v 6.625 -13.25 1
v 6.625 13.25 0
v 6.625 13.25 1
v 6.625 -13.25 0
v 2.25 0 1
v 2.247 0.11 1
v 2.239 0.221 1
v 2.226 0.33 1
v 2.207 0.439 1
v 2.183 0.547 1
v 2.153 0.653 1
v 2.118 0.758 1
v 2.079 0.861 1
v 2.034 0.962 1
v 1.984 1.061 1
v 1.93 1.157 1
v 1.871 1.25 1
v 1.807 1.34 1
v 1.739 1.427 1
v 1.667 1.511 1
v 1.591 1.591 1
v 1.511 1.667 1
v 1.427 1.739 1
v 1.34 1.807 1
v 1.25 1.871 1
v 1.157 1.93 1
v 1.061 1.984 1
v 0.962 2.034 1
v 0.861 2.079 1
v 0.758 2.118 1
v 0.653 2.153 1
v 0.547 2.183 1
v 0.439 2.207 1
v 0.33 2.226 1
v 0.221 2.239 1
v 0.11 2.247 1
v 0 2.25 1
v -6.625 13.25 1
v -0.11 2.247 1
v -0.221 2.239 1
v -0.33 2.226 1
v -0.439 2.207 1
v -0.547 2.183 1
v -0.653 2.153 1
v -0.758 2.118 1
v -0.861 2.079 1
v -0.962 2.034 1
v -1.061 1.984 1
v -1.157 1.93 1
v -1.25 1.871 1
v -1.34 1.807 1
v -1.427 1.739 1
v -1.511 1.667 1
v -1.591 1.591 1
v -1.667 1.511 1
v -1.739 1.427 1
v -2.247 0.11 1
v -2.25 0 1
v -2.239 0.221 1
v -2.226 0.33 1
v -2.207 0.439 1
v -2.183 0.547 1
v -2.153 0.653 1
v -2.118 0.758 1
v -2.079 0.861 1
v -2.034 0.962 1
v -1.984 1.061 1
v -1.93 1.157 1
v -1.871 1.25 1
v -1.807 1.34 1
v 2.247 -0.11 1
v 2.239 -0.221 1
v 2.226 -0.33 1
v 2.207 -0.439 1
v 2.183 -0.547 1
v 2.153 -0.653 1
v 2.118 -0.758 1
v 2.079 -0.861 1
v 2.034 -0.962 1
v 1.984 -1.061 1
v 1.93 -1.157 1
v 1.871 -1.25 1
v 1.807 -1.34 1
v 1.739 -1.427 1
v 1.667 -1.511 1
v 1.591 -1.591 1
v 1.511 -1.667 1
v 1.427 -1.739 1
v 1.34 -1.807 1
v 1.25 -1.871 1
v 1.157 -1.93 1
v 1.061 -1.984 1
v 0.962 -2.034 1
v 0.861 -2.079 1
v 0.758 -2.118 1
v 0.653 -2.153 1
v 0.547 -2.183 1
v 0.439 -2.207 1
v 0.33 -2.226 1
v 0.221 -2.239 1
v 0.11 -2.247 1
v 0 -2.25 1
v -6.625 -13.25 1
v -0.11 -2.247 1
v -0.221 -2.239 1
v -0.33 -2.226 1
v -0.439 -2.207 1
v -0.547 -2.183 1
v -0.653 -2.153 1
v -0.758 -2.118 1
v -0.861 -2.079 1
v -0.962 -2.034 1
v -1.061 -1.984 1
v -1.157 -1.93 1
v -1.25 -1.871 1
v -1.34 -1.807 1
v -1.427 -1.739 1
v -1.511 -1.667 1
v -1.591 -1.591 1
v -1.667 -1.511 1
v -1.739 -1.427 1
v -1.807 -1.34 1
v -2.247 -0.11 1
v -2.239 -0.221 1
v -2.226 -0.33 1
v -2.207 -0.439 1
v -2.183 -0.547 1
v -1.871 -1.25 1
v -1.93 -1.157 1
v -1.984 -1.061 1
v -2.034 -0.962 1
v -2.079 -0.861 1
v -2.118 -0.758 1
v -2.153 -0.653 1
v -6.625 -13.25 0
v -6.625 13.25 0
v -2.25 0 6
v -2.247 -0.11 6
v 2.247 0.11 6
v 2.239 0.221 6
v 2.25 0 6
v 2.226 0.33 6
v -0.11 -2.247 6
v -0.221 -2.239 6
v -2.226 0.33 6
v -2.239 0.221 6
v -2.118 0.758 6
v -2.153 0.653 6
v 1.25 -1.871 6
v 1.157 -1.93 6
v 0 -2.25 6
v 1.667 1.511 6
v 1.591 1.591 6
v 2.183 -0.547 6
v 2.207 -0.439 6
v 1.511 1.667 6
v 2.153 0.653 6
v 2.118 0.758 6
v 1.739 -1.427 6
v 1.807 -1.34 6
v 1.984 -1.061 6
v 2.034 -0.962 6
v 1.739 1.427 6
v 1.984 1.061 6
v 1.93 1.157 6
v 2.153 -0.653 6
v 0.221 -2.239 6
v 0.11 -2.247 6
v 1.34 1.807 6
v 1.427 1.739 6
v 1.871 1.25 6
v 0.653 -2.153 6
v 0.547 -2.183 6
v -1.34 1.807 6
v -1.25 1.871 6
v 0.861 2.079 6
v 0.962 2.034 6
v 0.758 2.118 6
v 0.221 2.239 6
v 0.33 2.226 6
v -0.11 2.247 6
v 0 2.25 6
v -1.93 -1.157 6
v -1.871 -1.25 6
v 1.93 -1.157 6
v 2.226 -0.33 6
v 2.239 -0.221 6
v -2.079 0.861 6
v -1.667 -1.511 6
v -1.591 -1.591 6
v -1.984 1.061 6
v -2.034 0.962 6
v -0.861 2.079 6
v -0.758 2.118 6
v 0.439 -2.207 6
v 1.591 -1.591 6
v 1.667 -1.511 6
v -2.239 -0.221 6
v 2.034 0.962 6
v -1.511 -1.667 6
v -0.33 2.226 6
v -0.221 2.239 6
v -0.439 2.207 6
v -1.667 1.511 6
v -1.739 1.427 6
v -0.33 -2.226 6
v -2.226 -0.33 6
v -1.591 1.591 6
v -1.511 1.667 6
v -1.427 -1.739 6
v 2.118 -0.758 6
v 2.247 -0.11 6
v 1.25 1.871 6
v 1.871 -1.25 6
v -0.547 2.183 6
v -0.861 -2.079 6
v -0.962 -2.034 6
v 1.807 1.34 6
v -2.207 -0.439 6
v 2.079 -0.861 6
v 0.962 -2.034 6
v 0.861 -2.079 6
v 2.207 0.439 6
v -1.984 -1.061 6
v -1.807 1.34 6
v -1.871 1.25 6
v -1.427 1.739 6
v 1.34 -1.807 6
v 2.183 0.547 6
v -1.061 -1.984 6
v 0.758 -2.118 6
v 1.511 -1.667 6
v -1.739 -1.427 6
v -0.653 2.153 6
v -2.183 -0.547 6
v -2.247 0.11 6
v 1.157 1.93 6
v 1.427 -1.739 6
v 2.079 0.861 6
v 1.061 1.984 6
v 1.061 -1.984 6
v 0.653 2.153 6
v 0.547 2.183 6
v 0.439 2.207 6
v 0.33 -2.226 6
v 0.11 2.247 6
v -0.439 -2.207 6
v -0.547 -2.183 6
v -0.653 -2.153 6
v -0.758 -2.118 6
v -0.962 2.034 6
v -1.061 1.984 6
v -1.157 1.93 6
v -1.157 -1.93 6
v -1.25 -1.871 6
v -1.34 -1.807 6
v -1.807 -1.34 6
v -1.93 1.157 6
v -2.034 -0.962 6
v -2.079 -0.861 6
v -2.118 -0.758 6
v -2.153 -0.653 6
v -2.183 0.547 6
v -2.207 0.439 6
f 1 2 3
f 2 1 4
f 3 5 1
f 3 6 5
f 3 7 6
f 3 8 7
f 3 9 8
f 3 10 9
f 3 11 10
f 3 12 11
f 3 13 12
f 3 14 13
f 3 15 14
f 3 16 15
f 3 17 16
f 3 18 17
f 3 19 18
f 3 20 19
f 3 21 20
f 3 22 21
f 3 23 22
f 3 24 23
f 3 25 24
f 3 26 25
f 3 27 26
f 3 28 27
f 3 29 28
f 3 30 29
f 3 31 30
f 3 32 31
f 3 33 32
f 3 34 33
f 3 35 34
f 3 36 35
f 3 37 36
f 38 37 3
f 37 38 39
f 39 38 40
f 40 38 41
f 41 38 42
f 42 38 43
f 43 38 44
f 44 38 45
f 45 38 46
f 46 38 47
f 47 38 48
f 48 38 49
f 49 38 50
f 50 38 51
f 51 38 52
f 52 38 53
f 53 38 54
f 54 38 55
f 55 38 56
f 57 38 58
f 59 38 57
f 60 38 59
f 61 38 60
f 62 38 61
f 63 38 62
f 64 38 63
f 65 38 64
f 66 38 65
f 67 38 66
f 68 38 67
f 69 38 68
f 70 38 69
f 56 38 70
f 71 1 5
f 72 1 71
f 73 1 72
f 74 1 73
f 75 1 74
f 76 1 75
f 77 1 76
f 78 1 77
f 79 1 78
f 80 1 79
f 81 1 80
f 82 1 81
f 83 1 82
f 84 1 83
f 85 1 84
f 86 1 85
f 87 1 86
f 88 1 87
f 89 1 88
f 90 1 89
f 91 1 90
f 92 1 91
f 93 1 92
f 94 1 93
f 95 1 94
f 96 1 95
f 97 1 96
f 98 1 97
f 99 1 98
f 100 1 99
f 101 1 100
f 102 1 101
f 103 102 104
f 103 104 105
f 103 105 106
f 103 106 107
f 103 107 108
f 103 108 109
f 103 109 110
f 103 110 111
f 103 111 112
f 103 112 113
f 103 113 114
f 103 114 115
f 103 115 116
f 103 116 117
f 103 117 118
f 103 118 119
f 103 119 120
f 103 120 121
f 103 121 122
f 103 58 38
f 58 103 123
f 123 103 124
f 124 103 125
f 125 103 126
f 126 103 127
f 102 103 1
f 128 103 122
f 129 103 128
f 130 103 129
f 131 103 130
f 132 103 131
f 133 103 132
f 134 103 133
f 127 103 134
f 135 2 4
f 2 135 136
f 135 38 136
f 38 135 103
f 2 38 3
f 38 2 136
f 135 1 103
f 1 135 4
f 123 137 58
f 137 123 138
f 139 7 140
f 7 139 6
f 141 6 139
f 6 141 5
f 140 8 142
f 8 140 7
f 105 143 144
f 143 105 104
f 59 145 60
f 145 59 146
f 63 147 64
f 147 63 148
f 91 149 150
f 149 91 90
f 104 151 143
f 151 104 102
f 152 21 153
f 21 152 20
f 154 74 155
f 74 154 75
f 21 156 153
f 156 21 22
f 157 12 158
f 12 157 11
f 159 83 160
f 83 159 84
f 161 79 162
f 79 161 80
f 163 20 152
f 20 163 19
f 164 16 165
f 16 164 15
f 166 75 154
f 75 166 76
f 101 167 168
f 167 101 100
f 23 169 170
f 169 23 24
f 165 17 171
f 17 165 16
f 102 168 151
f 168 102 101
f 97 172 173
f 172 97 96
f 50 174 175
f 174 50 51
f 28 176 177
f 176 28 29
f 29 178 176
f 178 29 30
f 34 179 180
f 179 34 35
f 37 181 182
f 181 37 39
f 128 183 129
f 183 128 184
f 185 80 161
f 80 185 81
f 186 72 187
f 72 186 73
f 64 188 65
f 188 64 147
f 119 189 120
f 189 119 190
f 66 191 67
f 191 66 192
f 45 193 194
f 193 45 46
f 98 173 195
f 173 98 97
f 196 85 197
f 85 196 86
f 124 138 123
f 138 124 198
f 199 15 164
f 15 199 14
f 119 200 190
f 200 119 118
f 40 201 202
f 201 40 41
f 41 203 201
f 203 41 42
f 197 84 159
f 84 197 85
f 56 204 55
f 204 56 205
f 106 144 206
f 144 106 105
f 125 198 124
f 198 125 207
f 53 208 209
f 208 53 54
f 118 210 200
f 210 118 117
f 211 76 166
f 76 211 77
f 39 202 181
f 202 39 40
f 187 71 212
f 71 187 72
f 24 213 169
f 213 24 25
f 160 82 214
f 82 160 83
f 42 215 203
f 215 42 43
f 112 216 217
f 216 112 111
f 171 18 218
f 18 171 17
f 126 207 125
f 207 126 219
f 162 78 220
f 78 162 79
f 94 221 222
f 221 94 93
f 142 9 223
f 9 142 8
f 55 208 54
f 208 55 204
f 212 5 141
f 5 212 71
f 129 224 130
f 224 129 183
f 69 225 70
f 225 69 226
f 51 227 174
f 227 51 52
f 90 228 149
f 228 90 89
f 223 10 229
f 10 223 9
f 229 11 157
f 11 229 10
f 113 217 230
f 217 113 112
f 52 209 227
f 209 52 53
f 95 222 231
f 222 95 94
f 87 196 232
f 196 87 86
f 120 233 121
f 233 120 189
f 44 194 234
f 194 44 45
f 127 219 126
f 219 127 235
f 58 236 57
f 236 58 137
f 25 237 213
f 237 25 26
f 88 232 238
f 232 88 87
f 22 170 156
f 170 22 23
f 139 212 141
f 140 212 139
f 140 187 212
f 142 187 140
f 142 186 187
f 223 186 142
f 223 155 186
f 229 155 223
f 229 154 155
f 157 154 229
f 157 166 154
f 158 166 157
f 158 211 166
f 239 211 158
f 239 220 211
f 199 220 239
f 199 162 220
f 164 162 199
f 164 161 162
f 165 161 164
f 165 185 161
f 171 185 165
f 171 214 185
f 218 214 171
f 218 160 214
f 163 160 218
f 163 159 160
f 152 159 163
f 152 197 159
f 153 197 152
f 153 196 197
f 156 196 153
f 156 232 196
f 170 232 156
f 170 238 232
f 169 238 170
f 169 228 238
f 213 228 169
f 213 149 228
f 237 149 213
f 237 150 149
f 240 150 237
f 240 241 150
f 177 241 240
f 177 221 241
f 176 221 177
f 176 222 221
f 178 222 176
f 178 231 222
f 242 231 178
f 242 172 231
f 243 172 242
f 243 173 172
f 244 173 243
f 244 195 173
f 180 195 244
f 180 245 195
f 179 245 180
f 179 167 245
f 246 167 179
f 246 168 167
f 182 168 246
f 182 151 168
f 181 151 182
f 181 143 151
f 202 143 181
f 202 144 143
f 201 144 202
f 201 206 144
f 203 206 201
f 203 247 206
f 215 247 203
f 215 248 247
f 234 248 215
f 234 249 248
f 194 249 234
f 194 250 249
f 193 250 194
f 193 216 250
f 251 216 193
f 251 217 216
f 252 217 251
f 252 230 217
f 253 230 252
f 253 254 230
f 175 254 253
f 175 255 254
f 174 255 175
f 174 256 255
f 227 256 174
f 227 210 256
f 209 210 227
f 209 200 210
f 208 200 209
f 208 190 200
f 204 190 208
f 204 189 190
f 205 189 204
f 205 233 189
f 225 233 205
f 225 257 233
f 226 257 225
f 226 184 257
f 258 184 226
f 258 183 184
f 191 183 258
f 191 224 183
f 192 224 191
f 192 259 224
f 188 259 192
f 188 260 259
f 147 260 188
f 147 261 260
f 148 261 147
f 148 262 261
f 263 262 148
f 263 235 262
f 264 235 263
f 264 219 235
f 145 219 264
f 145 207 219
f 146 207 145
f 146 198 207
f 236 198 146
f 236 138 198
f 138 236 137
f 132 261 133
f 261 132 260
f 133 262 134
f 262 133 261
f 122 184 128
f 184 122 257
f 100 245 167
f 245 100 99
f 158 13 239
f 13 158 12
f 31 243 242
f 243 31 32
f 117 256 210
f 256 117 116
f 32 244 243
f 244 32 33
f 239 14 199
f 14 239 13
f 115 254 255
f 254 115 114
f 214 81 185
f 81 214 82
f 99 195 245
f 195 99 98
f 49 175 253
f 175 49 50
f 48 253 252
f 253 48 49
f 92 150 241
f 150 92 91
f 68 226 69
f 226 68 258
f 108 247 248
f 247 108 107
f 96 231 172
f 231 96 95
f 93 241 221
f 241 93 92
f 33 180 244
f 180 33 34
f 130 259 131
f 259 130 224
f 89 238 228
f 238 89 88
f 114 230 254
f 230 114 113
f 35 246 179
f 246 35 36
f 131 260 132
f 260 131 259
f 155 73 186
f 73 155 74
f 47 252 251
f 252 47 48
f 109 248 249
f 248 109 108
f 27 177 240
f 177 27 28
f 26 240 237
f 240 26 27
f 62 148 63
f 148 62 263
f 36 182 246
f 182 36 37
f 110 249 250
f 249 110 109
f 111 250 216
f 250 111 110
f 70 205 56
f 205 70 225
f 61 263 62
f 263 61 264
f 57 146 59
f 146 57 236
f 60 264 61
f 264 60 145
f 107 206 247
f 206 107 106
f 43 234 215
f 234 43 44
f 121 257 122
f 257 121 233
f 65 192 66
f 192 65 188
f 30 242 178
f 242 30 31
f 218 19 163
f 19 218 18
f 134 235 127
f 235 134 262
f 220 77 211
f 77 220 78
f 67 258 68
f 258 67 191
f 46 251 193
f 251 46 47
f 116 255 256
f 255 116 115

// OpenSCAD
// file: position_indicator_number.scad
/* RailEduKit/InteractiveSignallingLaboratory © 2025 by Martin Scheidt and contributors
 * License: CC-BY 4.0 - https://creativecommons.org/licenses/by/4.0/
 * Project description: The Interactive Signalling Laboratory is a tool for training in Rail
 * Applications to enhance the knowledge of control and signalling principles for rail transport systems.
 *
 * Module: position_indicator_number
 */

include <../config/global_variables.scad>
include <../config/colors.scad>

include <position_indicator_plate.scad>


module frame() {
	difference() {
		cube([ frame_width, frame_depth, 2 ], center = true);
		cube([ frame_width - 1, frame_depth - 1, 3 ], center = true);
	}
}

module piece_number(number) {
	color(INDICATOR_COLOR) union(){
		translate([ 0, 0, number_height ])
		rotate([ 180, 0, 0 ])
		linear_extrude(height = number_height) text(str(number), 7.5, halign = "center", valign = "center");
	}
}

module position_indicator_number() {
	translate([ x_start + 0 * step_size, y_start + 0.0 * step_size, 0 ])
	piece_number(1);
	translate([ x_start + 0 * step_size, y_start + 1.0 * step_size, 0 ])
	piece_number(2);
	translate([ x_start + 0 * step_size, y_start + 2.0 * step_size, 0 ])
	piece_number(3);
	translate([ x_start + 0 * step_size, y_start + 3.0 * step_size, 0 ])
	piece_number(4);
	translate([ x_start + 0 * step_size, y_start + 4.0 * step_size, 0 ])
	piece_number(5);
	translate([ x_start + 1 * step_size, y_start + 0.0 * step_size, 0 ])
	piece_number(6);
	translate([ x_start + 1 * step_size, y_start + 1.0 * step_size, 0 ])
	piece_number(7);
	translate([ x_start + 1 * step_size, y_start + 2.0 * step_size, 0 ])
	piece_number(8);
	translate([ x_start + 1 * step_size, y_start + 3.0 * step_size, 0 ])
	piece_number(9);
	translate([ x_start + 1 * step_size, y_start + 4.0 * step_size, 0 ])
	piece_number(10);
	translate([ x_start + 2 * step_size, y_start + 0.0 * step_size, 0 ])
	piece_number(11);
	translate([ x_start + 2 * step_size, y_start + 1.0 * step_size, 0 ])
	piece_number(12);
	translate([ x_start + 2 * step_size, y_start + 2.0 * step_size, 0 ])
	piece_number(13);
	translate([ x_start + 2 * step_size, y_start + 3.0 * step_size, 0 ])
	piece_number(14);
	translate([ x_start + 2 * step_size, y_start + 4.0 * step_size, 0 ])
	piece_number(15);
	translate([ x_start + 3 * step_size, y_start + 0.0 * step_size, 0 ])
	piece_number(16);
	translate([ x_start + 3 * step_size, y_start + 1.0 * step_size, 0 ])
	piece_number(17);
	translate([ x_start + 3 * step_size, y_start + 2.0 * step_size, 0 ])
	piece_number(18);
	translate([ x_start + 3 * step_size, y_start + 3.0 * step_size, 0 ])
	piece_number(19);
	translate([ x_start + 3 * step_size, y_start + 4.0 * step_size, 0 ])
	piece_number(20);
	translate([ x_start + 4 * step_size, y_start + 0.0 * step_size, 0 ])
	piece_number(21);
	translate([ x_start + 4 * step_size, y_start + 1.0 * step_size, 0 ])
	piece_number(22);
	translate([ x_start + 4 * step_size, y_start + 2.0 * step_size, 0 ])
	piece_number(23);
	translate([ x_start + 4 * step_size, y_start + 3.0 * step_size, 0 ])
	piece_number(24);
	translate([ x_start + 4 * step_size, y_start + 4.0 * step_size, 0 ])
	piece_number(25);
	translate([ x_start + 5 * step_size, y_start + 0.0 * step_size, 0 ])
	piece_number(26);
	translate([ x_start + 5 * step_size, y_start + 1.0 * step_size, 0 ])
	piece_number(27);
	translate([ x_start + 5 * step_size, y_start + 2.0 * step_size, 0 ])
	piece_number(28);
	translate([ x_start + 5 * step_size, y_start + 3.0 * step_size, 0 ])
	piece_number(29);
	translate([ x_start + 5 * step_size, y_start + 4.0 * step_size, 0 ])
	piece_number(30);
	translate([ x_start + 6 * step_size, y_start + 0.0 * step_size, 0 ])
	piece_number(31);
	translate([ x_start + 6 * step_size, y_start + 1.0 * step_size, 0 ])
	piece_number(32);
	translate([ x_start + 6 * step_size, y_start + 2.0 * step_size, 0 ])
	piece_number(33);
	translate([ x_start + 6 * step_size, y_start + 3.0 * step_size, 0 ])
	piece_number(34);
	translate([ x_start + 6 * step_size, y_start + 4.0 * step_size, 0 ])
	piece_number(35);
	translate([ x_start + 7 * step_size, y_start + 0.0 * step_size, 0 ])
	piece_number(36);
	translate([ x_start + 7 * step_size, y_start + 1.0 * step_size, 0 ])
	piece_number(37);
	translate([ x_start + 7 * step_size, y_start + 2.0 * step_size, 0 ])
	piece_number(38);
	translate([ x_start + 7 * step_size, y_start + 3.0 * step_size, 0 ])
	piece_number(39);
	translate([ x_start + 7 * step_size, y_start + 4.0 * step_size, 0 ])
	piece_number(40);
	translate([ x_start + 8 * step_size, y_start + 0.0 * step_size, 0 ])
	piece_number(41);
	translate([ x_start + 8 * step_size, y_start + 1.0 * step_size, 0 ])
	piece_number(42);
	translate([ x_start + 8 * step_size, y_start + 2.0 * step_size, 0 ])
	piece_number(43);
	translate([ x_start + 8 * step_size, y_start + 3.0 * step_size, 0 ])
	piece_number(44);
	translate([ x_start + 8 * step_size, y_start + 4.0 * step_size, 0 ])
	piece_number(45);
	translate([ x_start + 9 * step_size, y_start + 0.0 * step_size, 0 ])
	piece_number(46);
	translate([ x_start + 9 * step_size, y_start + 1.0 * step_size, 0 ])
	piece_number(47);
	translate([ x_start + 9 * step_size, y_start + 2.0 * step_size, 0 ])
	piece_number(48);
	translate([ x_start + 9 * step_size, y_start + 3.0 * step_size, 0 ])
	piece_number(49);
	translate([ x_start + 9 * step_size, y_start + 4.0 * step_size, 0 ])
	piece_number(50);
	translate([ x_start + 10 * step_size, y_start + 0.0 * step_size, 0 ])
	piece_number(51);
	translate([ x_start + 10 * step_size, y_start + 1.0 * step_size, 0 ])
	piece_number(52);
	translate([ x_start + 10 * step_size, y_start + 2.0 * step_size, 0 ])
	piece_number(53);
	translate([ x_start + 10 * step_size, y_start + 3.0 * step_size, 0 ])
	piece_number(54);
	translate([ x_start + 10 * step_size, y_start + 4.0 * step_size, 0 ])
	piece_number(55);
	translate([ x_start + 11 * step_size, y_start + 0.0 * step_size, 0 ])
	piece_number(56);
	translate([ x_start + 11 * step_size, y_start + 1.0 * step_size, 0 ])
	piece_number(57);
	translate([ x_start + 11 * step_size, y_start + 2.0 * step_size, 0 ])
	piece_number(58);
	translate([ x_start + 11 * step_size, y_start + 3.0 * step_size, 0 ])
	piece_number(59);
	translate([ x_start + 11 * step_size, y_start + 4.0 * step_size, 0 ])
	piece_number(60);
}

position_indicator_number();
// file: ../config/colors.scad
/* RailEduKit/InteractiveSignallingLaboratory © 2025 by Martin Scheidt and contributors
 * License: CC-BY 4.0 - https://creativecommons.org/licenses/by/4.0/
 * Project description: The Interactive Signalling Laboratory is a tool for training in Rail
 * Applications to enhance the knowledge of control and signalling principles for rail transport systems.
 *
 * Module: config/colors.scad
 */

// component colors
BASE_COLOR = "black";
INDICATOR_COLOR = "white";
ROUTE_COLOR = "blue";

// signal colors
ASPECT_CLEAR = "green";
ASPECT_APPROACH = "yellow";
ASPECT_STOP = "red";
// file: position_indicator_plate.scad
/* RailEduKit/InteractiveSignallingLaboratory © 2025 by Martin Scheidt and contributors
 * License: CC-BY 4.0 - https://creativecommons.org/licenses/by/4.0/
 * Project description: The Interactive Signalling Laboratory is a tool for training in Rail
 * Applications to enhance the knowledge of control and signalling principles for rail transport systems.
 *
 * Module: position_indicator_plate
 */






include <../config/global_variables.scad>
include <../config/colors.scad>

// use common parts
use <position_indicator_number.scad>


// number_plate = np
np_diameter = rail_well_spacing-2*3;
function np_height() = 1;
number_height = 0.6;

// om_pin variables are defined in track_indicator flexible   
function np_pin_diameter() = 4.5;
function np_pin_height() = 5;

frame_width = 180;
frame_depth = 180;
step_size = np_diameter+2*move_tolerance;
x_start = -(frame_width/2-np_diameter/2-1);
y_start = -(frame_depth/2-np_diameter/2-1);



module frame() {
	difference() {
		cube([ frame_width, frame_depth, 2 ], center = true);
		cube([ frame_width - 1, frame_depth - 1, 3 ], center = true);
	}
}

module number_plate(number) {
	color(BASE_COLOR) union(){
		difference() {
			cylinder(d = np_diameter, h = np_height());
			piece_number(number);
		}
		translate([ 0, 0, np_height() ])
		cylinder(h = np_pin_height(), d = np_pin_diameter());
	}

}

module position_indicator_plate() {
	/* counter = 0;
	for(x = [-(frame_width/2-np_diameter/2-1): np_diameter+2*move_tolerance: (frame_width/2-np_diameter/2-1)]){
	    for(y= [-(frame_depth/2-np_diameter/2-1): np_diameter+2*move_tolerance: (frame_depth/2-np_diameter/2-1)]){
	        translate([x,y,0])number_plate(counter);
	        counter = counter + 1;
	    }
	} */
	// generated with number_plates_creation.jl
	// still slow with rendering.
	translate([ x_start + 0 * step_size, y_start + 0.0 * step_size, 0 ])
	number_plate(1);
	translate([ x_start + 0 * step_size, y_start + 1.0 * step_size, 0 ])
	number_plate(2);
	translate([ x_start + 0 * step_size, y_start + 2.0 * step_size, 0 ])
	number_plate(3);
	translate([ x_start + 0 * step_size, y_start + 3.0 * step_size, 0 ])
	number_plate(4);
	translate([ x_start + 0 * step_size, y_start + 4.0 * step_size, 0 ])
	number_plate(5);
	translate([ x_start + 1 * step_size, y_start + 0.0 * step_size, 0 ])
	number_plate(6);
	translate([ x_start + 1 * step_size, y_start + 1.0 * step_size, 0 ])
	number_plate(7);
	translate([ x_start + 1 * step_size, y_start + 2.0 * step_size, 0 ])
	number_plate(8);
	translate([ x_start + 1 * step_size, y_start + 3.0 * step_size, 0 ])
	number_plate(9);
	translate([ x_start + 1 * step_size, y_start + 4.0 * step_size, 0 ])
	number_plate(10);
	translate([ x_start + 2 * step_size, y_start + 0.0 * step_size, 0 ])
	number_plate(11);
	translate([ x_start + 2 * step_size, y_start + 1.0 * step_size, 0 ])
	number_plate(12);
	translate([ x_start + 2 * step_size, y_start + 2.0 * step_size, 0 ])
	number_plate(13);
	translate([ x_start + 2 * step_size, y_start + 3.0 * step_size, 0 ])
	number_plate(14);
	translate([ x_start + 2 * step_size, y_start + 4.0 * step_size, 0 ])
	number_plate(15);
	translate([ x_start + 3 * step_size, y_start + 0.0 * step_size, 0 ])
	number_plate(16);
	translate([ x_start + 3 * step_size, y_start + 1.0 * step_size, 0 ])
	number_plate(17);
	translate([ x_start + 3 * step_size, y_start + 2.0 * step_size, 0 ])
	number_plate(18);
	translate([ x_start + 3 * step_size, y_start + 3.0 * step_size, 0 ])
	number_plate(19);
	translate([ x_start + 3 * step_size, y_start + 4.0 * step_size, 0 ])
	number_plate(20);
	translate([ x_start + 4 * step_size, y_start + 0.0 * step_size, 0 ])
	number_plate(21);
	translate([ x_start + 4 * step_size, y_start + 1.0 * step_size, 0 ])
	number_plate(22);
	translate([ x_start + 4 * step_size, y_start + 2.0 * step_size, 0 ])
	number_plate(23);
	translate([ x_start + 4 * step_size, y_start + 3.0 * step_size, 0 ])
	number_plate(24);
	translate([ x_start + 4 * step_size, y_start + 4.0 * step_size, 0 ])
	number_plate(25);
	translate([ x_start + 5 * step_size, y_start + 0.0 * step_size, 0 ])
	number_plate(26);
	translate([ x_start + 5 * step_size, y_start + 1.0 * step_size, 0 ])
	number_plate(27);
	translate([ x_start + 5 * step_size, y_start + 2.0 * step_size, 0 ])
	number_plate(28);
	translate([ x_start + 5 * step_size, y_start + 3.0 * step_size, 0 ])
	number_plate(29);
	translate([ x_start + 5 * step_size, y_start + 4.0 * step_size, 0 ])
	number_plate(30);
	translate([ x_start + 6 * step_size, y_start + 0.0 * step_size, 0 ])
	number_plate(31);
	translate([ x_start + 6 * step_size, y_start + 1.0 * step_size, 0 ])
	number_plate(32);
	translate([ x_start + 6 * step_size, y_start + 2.0 * step_size, 0 ])
	number_plate(33);
	translate([ x_start + 6 * step_size, y_start + 3.0 * step_size, 0 ])
	number_plate(34);
	translate([ x_start + 6 * step_size, y_start + 4.0 * step_size, 0 ])
	number_plate(35);
	translate([ x_start + 7 * step_size, y_start + 0.0 * step_size, 0 ])
	number_plate(36);
	translate([ x_start + 7 * step_size, y_start + 1.0 * step_size, 0 ])
	number_plate(37);
	translate([ x_start + 7 * step_size, y_start + 2.0 * step_size, 0 ])
	number_plate(38);
	translate([ x_start + 7 * step_size, y_start + 3.0 * step_size, 0 ])
	number_plate(39);
	translate([ x_start + 7 * step_size, y_start + 4.0 * step_size, 0 ])
	number_plate(40);
	translate([ x_start + 8 * step_size, y_start + 0.0 * step_size, 0 ])
	number_plate(41);
	translate([ x_start + 8 * step_size, y_start + 1.0 * step_size, 0 ])
	number_plate(42);
	translate([ x_start + 8 * step_size, y_start + 2.0 * step_size, 0 ])
	number_plate(43);
	translate([ x_start + 8 * step_size, y_start + 3.0 * step_size, 0 ])
	number_plate(44);
	translate([ x_start + 8 * step_size, y_start + 4.0 * step_size, 0 ])
	number_plate(45);
	translate([ x_start + 9 * step_size, y_start + 0.0 * step_size, 0 ])
	number_plate(46);
	translate([ x_start + 9 * step_size, y_start + 1.0 * step_size, 0 ])
	number_plate(47);
	translate([ x_start + 9 * step_size, y_start + 2.0 * step_size, 0 ])
	number_plate(48);
	translate([ x_start + 9 * step_size, y_start + 3.0 * step_size, 0 ])
	number_plate(49);
	translate([ x_start + 9 * step_size, y_start + 4.0 * step_size, 0 ])
	number_plate(50);
	translate([ x_start + 10 * step_size, y_start + 0.0 * step_size, 0 ])
	number_plate(51);
	translate([ x_start + 10 * step_size, y_start + 1.0 * step_size, 0 ])
	number_plate(52);
	translate([ x_start + 10 * step_size, y_start + 2.0 * step_size, 0 ])
	number_plate(53);
	translate([ x_start + 10 * step_size, y_start + 3.0 * step_size, 0 ])
	number_plate(54);
	translate([ x_start + 10 * step_size, y_start + 4.0 * step_size, 0 ])
	number_plate(55);
	translate([ x_start + 11 * step_size, y_start + 0.0 * step_size, 0 ])
	number_plate(56);
	translate([ x_start + 11 * step_size, y_start + 1.0 * step_size, 0 ])
	number_plate(57);
	translate([ x_start + 11 * step_size, y_start + 2.0 * step_size, 0 ])
	number_plate(58);
	translate([ x_start + 11 * step_size, y_start + 3.0 * step_size, 0 ])
	number_plate(59);
	translate([ x_start + 11 * step_size, y_start + 4.0 * step_size, 0 ])
	number_plate(60);
}

position_indicator_plate();
// file: ../config/global_variables.scad
/* RailEduKit/InteractiveSignallingLaboratory © 2025 by Martin Scheidt and contributors
 * License: CC-BY 4.0 - https://creativecommons.org/licenses/by/4.0/
 * Project description: The Interactive Signalling Laboratory is a tool for training in Rail
 * Applications to enhance the knowledge of control and signalling principles for rail transport systems.
 *
 * Module: config/global_variables.scad
 */


/*************** resolution ***************/
// number of fragments; default 0;
//When this variable has a value greater than zero, the two variables $fa and $fs are ignored
$fn = $preview ? 32 : 128;

// $fa = 12;// minimum angle for a fragment; default 12; minimum allowed value is 0.01
// $fs = 2;// minimum size of a fragment; default 2; minimum allowed value is 0.01

/*****
To have the dimensions of all components at one place
*******/

/*******
TODO
- standard on which part the move tolerance is substracted?
******/
// ATTENTION: Note the general move_tolerance of 0.5

move_tolerance = 0.5;

nozzle_diameter = 0.4;

{/***************wood rail specification***************/
    // rail instead of wood to prevent duplicate variables with tracklib.scad file
    rail_height = 12;
    rail_width = 40;
    rail_thickness_track = 6;
    rail_well_height = 9; // copy from tracklib
    rail_well_width = 5.7; // copy from tracklib
    rail_well_spacing = 19.25; // copy from tracklib
    rail_groove_depth = rail_height - rail_well_height;

    straight_length = 144;

    curve_inner_radius = 180; // 182; // inner radius
    curve_middle_radius = curve_inner_radius+rail_width/2;
    curve_outer_radius = curve_inner_radius+rail_width;
    curve_angle = 45.7; // degree
    curve_length_middle_radius = (2*PI*curve_middle_radius*curve_angle)/360;
}
{/***************engraving specifications***************/
    engraving_height = 2;//(block_height-handle_height)/2;
    engraving_thickness = 1.5;
    
    fine_line = 0.2;
    thin_line = 0.8;
    regular_line = 1;
}
// main file
/* RailEduKit/InteractiveSignallingLaboratory © 2025 by Martin Scheidt and contributors
 * License: CC-BY 4.0 - https://creativecommons.org/licenses/by/4.0/
 * Project description: The Interactive Signalling Laboratory is a tool for training in Rail
 * Applications to enhance the knowledge of control and signalling principles for rail transport systems.
 *
 * Module: Balise
 */

// Include configuration file
include <../config/global_variables.scad>

// Include common parts
use <position_indicator_plate.scad>

balise_width = rail_well_spacing-2*3;
balise_depth = 2* balise_width;
balise_height = np_height();

balise_pin_diameter = np_pin_diameter();
balise_pin_height = np_pin_height();

module balise() {
	translate([ 0, 0, balise_height / 2 ])
	cube([ balise_width, balise_depth, balise_height ], center = true);
	translate([ 0, 0, balise_height ])
	cylinder(d = balise_pin_diameter, h = balise_pin_height);
}

balise();
